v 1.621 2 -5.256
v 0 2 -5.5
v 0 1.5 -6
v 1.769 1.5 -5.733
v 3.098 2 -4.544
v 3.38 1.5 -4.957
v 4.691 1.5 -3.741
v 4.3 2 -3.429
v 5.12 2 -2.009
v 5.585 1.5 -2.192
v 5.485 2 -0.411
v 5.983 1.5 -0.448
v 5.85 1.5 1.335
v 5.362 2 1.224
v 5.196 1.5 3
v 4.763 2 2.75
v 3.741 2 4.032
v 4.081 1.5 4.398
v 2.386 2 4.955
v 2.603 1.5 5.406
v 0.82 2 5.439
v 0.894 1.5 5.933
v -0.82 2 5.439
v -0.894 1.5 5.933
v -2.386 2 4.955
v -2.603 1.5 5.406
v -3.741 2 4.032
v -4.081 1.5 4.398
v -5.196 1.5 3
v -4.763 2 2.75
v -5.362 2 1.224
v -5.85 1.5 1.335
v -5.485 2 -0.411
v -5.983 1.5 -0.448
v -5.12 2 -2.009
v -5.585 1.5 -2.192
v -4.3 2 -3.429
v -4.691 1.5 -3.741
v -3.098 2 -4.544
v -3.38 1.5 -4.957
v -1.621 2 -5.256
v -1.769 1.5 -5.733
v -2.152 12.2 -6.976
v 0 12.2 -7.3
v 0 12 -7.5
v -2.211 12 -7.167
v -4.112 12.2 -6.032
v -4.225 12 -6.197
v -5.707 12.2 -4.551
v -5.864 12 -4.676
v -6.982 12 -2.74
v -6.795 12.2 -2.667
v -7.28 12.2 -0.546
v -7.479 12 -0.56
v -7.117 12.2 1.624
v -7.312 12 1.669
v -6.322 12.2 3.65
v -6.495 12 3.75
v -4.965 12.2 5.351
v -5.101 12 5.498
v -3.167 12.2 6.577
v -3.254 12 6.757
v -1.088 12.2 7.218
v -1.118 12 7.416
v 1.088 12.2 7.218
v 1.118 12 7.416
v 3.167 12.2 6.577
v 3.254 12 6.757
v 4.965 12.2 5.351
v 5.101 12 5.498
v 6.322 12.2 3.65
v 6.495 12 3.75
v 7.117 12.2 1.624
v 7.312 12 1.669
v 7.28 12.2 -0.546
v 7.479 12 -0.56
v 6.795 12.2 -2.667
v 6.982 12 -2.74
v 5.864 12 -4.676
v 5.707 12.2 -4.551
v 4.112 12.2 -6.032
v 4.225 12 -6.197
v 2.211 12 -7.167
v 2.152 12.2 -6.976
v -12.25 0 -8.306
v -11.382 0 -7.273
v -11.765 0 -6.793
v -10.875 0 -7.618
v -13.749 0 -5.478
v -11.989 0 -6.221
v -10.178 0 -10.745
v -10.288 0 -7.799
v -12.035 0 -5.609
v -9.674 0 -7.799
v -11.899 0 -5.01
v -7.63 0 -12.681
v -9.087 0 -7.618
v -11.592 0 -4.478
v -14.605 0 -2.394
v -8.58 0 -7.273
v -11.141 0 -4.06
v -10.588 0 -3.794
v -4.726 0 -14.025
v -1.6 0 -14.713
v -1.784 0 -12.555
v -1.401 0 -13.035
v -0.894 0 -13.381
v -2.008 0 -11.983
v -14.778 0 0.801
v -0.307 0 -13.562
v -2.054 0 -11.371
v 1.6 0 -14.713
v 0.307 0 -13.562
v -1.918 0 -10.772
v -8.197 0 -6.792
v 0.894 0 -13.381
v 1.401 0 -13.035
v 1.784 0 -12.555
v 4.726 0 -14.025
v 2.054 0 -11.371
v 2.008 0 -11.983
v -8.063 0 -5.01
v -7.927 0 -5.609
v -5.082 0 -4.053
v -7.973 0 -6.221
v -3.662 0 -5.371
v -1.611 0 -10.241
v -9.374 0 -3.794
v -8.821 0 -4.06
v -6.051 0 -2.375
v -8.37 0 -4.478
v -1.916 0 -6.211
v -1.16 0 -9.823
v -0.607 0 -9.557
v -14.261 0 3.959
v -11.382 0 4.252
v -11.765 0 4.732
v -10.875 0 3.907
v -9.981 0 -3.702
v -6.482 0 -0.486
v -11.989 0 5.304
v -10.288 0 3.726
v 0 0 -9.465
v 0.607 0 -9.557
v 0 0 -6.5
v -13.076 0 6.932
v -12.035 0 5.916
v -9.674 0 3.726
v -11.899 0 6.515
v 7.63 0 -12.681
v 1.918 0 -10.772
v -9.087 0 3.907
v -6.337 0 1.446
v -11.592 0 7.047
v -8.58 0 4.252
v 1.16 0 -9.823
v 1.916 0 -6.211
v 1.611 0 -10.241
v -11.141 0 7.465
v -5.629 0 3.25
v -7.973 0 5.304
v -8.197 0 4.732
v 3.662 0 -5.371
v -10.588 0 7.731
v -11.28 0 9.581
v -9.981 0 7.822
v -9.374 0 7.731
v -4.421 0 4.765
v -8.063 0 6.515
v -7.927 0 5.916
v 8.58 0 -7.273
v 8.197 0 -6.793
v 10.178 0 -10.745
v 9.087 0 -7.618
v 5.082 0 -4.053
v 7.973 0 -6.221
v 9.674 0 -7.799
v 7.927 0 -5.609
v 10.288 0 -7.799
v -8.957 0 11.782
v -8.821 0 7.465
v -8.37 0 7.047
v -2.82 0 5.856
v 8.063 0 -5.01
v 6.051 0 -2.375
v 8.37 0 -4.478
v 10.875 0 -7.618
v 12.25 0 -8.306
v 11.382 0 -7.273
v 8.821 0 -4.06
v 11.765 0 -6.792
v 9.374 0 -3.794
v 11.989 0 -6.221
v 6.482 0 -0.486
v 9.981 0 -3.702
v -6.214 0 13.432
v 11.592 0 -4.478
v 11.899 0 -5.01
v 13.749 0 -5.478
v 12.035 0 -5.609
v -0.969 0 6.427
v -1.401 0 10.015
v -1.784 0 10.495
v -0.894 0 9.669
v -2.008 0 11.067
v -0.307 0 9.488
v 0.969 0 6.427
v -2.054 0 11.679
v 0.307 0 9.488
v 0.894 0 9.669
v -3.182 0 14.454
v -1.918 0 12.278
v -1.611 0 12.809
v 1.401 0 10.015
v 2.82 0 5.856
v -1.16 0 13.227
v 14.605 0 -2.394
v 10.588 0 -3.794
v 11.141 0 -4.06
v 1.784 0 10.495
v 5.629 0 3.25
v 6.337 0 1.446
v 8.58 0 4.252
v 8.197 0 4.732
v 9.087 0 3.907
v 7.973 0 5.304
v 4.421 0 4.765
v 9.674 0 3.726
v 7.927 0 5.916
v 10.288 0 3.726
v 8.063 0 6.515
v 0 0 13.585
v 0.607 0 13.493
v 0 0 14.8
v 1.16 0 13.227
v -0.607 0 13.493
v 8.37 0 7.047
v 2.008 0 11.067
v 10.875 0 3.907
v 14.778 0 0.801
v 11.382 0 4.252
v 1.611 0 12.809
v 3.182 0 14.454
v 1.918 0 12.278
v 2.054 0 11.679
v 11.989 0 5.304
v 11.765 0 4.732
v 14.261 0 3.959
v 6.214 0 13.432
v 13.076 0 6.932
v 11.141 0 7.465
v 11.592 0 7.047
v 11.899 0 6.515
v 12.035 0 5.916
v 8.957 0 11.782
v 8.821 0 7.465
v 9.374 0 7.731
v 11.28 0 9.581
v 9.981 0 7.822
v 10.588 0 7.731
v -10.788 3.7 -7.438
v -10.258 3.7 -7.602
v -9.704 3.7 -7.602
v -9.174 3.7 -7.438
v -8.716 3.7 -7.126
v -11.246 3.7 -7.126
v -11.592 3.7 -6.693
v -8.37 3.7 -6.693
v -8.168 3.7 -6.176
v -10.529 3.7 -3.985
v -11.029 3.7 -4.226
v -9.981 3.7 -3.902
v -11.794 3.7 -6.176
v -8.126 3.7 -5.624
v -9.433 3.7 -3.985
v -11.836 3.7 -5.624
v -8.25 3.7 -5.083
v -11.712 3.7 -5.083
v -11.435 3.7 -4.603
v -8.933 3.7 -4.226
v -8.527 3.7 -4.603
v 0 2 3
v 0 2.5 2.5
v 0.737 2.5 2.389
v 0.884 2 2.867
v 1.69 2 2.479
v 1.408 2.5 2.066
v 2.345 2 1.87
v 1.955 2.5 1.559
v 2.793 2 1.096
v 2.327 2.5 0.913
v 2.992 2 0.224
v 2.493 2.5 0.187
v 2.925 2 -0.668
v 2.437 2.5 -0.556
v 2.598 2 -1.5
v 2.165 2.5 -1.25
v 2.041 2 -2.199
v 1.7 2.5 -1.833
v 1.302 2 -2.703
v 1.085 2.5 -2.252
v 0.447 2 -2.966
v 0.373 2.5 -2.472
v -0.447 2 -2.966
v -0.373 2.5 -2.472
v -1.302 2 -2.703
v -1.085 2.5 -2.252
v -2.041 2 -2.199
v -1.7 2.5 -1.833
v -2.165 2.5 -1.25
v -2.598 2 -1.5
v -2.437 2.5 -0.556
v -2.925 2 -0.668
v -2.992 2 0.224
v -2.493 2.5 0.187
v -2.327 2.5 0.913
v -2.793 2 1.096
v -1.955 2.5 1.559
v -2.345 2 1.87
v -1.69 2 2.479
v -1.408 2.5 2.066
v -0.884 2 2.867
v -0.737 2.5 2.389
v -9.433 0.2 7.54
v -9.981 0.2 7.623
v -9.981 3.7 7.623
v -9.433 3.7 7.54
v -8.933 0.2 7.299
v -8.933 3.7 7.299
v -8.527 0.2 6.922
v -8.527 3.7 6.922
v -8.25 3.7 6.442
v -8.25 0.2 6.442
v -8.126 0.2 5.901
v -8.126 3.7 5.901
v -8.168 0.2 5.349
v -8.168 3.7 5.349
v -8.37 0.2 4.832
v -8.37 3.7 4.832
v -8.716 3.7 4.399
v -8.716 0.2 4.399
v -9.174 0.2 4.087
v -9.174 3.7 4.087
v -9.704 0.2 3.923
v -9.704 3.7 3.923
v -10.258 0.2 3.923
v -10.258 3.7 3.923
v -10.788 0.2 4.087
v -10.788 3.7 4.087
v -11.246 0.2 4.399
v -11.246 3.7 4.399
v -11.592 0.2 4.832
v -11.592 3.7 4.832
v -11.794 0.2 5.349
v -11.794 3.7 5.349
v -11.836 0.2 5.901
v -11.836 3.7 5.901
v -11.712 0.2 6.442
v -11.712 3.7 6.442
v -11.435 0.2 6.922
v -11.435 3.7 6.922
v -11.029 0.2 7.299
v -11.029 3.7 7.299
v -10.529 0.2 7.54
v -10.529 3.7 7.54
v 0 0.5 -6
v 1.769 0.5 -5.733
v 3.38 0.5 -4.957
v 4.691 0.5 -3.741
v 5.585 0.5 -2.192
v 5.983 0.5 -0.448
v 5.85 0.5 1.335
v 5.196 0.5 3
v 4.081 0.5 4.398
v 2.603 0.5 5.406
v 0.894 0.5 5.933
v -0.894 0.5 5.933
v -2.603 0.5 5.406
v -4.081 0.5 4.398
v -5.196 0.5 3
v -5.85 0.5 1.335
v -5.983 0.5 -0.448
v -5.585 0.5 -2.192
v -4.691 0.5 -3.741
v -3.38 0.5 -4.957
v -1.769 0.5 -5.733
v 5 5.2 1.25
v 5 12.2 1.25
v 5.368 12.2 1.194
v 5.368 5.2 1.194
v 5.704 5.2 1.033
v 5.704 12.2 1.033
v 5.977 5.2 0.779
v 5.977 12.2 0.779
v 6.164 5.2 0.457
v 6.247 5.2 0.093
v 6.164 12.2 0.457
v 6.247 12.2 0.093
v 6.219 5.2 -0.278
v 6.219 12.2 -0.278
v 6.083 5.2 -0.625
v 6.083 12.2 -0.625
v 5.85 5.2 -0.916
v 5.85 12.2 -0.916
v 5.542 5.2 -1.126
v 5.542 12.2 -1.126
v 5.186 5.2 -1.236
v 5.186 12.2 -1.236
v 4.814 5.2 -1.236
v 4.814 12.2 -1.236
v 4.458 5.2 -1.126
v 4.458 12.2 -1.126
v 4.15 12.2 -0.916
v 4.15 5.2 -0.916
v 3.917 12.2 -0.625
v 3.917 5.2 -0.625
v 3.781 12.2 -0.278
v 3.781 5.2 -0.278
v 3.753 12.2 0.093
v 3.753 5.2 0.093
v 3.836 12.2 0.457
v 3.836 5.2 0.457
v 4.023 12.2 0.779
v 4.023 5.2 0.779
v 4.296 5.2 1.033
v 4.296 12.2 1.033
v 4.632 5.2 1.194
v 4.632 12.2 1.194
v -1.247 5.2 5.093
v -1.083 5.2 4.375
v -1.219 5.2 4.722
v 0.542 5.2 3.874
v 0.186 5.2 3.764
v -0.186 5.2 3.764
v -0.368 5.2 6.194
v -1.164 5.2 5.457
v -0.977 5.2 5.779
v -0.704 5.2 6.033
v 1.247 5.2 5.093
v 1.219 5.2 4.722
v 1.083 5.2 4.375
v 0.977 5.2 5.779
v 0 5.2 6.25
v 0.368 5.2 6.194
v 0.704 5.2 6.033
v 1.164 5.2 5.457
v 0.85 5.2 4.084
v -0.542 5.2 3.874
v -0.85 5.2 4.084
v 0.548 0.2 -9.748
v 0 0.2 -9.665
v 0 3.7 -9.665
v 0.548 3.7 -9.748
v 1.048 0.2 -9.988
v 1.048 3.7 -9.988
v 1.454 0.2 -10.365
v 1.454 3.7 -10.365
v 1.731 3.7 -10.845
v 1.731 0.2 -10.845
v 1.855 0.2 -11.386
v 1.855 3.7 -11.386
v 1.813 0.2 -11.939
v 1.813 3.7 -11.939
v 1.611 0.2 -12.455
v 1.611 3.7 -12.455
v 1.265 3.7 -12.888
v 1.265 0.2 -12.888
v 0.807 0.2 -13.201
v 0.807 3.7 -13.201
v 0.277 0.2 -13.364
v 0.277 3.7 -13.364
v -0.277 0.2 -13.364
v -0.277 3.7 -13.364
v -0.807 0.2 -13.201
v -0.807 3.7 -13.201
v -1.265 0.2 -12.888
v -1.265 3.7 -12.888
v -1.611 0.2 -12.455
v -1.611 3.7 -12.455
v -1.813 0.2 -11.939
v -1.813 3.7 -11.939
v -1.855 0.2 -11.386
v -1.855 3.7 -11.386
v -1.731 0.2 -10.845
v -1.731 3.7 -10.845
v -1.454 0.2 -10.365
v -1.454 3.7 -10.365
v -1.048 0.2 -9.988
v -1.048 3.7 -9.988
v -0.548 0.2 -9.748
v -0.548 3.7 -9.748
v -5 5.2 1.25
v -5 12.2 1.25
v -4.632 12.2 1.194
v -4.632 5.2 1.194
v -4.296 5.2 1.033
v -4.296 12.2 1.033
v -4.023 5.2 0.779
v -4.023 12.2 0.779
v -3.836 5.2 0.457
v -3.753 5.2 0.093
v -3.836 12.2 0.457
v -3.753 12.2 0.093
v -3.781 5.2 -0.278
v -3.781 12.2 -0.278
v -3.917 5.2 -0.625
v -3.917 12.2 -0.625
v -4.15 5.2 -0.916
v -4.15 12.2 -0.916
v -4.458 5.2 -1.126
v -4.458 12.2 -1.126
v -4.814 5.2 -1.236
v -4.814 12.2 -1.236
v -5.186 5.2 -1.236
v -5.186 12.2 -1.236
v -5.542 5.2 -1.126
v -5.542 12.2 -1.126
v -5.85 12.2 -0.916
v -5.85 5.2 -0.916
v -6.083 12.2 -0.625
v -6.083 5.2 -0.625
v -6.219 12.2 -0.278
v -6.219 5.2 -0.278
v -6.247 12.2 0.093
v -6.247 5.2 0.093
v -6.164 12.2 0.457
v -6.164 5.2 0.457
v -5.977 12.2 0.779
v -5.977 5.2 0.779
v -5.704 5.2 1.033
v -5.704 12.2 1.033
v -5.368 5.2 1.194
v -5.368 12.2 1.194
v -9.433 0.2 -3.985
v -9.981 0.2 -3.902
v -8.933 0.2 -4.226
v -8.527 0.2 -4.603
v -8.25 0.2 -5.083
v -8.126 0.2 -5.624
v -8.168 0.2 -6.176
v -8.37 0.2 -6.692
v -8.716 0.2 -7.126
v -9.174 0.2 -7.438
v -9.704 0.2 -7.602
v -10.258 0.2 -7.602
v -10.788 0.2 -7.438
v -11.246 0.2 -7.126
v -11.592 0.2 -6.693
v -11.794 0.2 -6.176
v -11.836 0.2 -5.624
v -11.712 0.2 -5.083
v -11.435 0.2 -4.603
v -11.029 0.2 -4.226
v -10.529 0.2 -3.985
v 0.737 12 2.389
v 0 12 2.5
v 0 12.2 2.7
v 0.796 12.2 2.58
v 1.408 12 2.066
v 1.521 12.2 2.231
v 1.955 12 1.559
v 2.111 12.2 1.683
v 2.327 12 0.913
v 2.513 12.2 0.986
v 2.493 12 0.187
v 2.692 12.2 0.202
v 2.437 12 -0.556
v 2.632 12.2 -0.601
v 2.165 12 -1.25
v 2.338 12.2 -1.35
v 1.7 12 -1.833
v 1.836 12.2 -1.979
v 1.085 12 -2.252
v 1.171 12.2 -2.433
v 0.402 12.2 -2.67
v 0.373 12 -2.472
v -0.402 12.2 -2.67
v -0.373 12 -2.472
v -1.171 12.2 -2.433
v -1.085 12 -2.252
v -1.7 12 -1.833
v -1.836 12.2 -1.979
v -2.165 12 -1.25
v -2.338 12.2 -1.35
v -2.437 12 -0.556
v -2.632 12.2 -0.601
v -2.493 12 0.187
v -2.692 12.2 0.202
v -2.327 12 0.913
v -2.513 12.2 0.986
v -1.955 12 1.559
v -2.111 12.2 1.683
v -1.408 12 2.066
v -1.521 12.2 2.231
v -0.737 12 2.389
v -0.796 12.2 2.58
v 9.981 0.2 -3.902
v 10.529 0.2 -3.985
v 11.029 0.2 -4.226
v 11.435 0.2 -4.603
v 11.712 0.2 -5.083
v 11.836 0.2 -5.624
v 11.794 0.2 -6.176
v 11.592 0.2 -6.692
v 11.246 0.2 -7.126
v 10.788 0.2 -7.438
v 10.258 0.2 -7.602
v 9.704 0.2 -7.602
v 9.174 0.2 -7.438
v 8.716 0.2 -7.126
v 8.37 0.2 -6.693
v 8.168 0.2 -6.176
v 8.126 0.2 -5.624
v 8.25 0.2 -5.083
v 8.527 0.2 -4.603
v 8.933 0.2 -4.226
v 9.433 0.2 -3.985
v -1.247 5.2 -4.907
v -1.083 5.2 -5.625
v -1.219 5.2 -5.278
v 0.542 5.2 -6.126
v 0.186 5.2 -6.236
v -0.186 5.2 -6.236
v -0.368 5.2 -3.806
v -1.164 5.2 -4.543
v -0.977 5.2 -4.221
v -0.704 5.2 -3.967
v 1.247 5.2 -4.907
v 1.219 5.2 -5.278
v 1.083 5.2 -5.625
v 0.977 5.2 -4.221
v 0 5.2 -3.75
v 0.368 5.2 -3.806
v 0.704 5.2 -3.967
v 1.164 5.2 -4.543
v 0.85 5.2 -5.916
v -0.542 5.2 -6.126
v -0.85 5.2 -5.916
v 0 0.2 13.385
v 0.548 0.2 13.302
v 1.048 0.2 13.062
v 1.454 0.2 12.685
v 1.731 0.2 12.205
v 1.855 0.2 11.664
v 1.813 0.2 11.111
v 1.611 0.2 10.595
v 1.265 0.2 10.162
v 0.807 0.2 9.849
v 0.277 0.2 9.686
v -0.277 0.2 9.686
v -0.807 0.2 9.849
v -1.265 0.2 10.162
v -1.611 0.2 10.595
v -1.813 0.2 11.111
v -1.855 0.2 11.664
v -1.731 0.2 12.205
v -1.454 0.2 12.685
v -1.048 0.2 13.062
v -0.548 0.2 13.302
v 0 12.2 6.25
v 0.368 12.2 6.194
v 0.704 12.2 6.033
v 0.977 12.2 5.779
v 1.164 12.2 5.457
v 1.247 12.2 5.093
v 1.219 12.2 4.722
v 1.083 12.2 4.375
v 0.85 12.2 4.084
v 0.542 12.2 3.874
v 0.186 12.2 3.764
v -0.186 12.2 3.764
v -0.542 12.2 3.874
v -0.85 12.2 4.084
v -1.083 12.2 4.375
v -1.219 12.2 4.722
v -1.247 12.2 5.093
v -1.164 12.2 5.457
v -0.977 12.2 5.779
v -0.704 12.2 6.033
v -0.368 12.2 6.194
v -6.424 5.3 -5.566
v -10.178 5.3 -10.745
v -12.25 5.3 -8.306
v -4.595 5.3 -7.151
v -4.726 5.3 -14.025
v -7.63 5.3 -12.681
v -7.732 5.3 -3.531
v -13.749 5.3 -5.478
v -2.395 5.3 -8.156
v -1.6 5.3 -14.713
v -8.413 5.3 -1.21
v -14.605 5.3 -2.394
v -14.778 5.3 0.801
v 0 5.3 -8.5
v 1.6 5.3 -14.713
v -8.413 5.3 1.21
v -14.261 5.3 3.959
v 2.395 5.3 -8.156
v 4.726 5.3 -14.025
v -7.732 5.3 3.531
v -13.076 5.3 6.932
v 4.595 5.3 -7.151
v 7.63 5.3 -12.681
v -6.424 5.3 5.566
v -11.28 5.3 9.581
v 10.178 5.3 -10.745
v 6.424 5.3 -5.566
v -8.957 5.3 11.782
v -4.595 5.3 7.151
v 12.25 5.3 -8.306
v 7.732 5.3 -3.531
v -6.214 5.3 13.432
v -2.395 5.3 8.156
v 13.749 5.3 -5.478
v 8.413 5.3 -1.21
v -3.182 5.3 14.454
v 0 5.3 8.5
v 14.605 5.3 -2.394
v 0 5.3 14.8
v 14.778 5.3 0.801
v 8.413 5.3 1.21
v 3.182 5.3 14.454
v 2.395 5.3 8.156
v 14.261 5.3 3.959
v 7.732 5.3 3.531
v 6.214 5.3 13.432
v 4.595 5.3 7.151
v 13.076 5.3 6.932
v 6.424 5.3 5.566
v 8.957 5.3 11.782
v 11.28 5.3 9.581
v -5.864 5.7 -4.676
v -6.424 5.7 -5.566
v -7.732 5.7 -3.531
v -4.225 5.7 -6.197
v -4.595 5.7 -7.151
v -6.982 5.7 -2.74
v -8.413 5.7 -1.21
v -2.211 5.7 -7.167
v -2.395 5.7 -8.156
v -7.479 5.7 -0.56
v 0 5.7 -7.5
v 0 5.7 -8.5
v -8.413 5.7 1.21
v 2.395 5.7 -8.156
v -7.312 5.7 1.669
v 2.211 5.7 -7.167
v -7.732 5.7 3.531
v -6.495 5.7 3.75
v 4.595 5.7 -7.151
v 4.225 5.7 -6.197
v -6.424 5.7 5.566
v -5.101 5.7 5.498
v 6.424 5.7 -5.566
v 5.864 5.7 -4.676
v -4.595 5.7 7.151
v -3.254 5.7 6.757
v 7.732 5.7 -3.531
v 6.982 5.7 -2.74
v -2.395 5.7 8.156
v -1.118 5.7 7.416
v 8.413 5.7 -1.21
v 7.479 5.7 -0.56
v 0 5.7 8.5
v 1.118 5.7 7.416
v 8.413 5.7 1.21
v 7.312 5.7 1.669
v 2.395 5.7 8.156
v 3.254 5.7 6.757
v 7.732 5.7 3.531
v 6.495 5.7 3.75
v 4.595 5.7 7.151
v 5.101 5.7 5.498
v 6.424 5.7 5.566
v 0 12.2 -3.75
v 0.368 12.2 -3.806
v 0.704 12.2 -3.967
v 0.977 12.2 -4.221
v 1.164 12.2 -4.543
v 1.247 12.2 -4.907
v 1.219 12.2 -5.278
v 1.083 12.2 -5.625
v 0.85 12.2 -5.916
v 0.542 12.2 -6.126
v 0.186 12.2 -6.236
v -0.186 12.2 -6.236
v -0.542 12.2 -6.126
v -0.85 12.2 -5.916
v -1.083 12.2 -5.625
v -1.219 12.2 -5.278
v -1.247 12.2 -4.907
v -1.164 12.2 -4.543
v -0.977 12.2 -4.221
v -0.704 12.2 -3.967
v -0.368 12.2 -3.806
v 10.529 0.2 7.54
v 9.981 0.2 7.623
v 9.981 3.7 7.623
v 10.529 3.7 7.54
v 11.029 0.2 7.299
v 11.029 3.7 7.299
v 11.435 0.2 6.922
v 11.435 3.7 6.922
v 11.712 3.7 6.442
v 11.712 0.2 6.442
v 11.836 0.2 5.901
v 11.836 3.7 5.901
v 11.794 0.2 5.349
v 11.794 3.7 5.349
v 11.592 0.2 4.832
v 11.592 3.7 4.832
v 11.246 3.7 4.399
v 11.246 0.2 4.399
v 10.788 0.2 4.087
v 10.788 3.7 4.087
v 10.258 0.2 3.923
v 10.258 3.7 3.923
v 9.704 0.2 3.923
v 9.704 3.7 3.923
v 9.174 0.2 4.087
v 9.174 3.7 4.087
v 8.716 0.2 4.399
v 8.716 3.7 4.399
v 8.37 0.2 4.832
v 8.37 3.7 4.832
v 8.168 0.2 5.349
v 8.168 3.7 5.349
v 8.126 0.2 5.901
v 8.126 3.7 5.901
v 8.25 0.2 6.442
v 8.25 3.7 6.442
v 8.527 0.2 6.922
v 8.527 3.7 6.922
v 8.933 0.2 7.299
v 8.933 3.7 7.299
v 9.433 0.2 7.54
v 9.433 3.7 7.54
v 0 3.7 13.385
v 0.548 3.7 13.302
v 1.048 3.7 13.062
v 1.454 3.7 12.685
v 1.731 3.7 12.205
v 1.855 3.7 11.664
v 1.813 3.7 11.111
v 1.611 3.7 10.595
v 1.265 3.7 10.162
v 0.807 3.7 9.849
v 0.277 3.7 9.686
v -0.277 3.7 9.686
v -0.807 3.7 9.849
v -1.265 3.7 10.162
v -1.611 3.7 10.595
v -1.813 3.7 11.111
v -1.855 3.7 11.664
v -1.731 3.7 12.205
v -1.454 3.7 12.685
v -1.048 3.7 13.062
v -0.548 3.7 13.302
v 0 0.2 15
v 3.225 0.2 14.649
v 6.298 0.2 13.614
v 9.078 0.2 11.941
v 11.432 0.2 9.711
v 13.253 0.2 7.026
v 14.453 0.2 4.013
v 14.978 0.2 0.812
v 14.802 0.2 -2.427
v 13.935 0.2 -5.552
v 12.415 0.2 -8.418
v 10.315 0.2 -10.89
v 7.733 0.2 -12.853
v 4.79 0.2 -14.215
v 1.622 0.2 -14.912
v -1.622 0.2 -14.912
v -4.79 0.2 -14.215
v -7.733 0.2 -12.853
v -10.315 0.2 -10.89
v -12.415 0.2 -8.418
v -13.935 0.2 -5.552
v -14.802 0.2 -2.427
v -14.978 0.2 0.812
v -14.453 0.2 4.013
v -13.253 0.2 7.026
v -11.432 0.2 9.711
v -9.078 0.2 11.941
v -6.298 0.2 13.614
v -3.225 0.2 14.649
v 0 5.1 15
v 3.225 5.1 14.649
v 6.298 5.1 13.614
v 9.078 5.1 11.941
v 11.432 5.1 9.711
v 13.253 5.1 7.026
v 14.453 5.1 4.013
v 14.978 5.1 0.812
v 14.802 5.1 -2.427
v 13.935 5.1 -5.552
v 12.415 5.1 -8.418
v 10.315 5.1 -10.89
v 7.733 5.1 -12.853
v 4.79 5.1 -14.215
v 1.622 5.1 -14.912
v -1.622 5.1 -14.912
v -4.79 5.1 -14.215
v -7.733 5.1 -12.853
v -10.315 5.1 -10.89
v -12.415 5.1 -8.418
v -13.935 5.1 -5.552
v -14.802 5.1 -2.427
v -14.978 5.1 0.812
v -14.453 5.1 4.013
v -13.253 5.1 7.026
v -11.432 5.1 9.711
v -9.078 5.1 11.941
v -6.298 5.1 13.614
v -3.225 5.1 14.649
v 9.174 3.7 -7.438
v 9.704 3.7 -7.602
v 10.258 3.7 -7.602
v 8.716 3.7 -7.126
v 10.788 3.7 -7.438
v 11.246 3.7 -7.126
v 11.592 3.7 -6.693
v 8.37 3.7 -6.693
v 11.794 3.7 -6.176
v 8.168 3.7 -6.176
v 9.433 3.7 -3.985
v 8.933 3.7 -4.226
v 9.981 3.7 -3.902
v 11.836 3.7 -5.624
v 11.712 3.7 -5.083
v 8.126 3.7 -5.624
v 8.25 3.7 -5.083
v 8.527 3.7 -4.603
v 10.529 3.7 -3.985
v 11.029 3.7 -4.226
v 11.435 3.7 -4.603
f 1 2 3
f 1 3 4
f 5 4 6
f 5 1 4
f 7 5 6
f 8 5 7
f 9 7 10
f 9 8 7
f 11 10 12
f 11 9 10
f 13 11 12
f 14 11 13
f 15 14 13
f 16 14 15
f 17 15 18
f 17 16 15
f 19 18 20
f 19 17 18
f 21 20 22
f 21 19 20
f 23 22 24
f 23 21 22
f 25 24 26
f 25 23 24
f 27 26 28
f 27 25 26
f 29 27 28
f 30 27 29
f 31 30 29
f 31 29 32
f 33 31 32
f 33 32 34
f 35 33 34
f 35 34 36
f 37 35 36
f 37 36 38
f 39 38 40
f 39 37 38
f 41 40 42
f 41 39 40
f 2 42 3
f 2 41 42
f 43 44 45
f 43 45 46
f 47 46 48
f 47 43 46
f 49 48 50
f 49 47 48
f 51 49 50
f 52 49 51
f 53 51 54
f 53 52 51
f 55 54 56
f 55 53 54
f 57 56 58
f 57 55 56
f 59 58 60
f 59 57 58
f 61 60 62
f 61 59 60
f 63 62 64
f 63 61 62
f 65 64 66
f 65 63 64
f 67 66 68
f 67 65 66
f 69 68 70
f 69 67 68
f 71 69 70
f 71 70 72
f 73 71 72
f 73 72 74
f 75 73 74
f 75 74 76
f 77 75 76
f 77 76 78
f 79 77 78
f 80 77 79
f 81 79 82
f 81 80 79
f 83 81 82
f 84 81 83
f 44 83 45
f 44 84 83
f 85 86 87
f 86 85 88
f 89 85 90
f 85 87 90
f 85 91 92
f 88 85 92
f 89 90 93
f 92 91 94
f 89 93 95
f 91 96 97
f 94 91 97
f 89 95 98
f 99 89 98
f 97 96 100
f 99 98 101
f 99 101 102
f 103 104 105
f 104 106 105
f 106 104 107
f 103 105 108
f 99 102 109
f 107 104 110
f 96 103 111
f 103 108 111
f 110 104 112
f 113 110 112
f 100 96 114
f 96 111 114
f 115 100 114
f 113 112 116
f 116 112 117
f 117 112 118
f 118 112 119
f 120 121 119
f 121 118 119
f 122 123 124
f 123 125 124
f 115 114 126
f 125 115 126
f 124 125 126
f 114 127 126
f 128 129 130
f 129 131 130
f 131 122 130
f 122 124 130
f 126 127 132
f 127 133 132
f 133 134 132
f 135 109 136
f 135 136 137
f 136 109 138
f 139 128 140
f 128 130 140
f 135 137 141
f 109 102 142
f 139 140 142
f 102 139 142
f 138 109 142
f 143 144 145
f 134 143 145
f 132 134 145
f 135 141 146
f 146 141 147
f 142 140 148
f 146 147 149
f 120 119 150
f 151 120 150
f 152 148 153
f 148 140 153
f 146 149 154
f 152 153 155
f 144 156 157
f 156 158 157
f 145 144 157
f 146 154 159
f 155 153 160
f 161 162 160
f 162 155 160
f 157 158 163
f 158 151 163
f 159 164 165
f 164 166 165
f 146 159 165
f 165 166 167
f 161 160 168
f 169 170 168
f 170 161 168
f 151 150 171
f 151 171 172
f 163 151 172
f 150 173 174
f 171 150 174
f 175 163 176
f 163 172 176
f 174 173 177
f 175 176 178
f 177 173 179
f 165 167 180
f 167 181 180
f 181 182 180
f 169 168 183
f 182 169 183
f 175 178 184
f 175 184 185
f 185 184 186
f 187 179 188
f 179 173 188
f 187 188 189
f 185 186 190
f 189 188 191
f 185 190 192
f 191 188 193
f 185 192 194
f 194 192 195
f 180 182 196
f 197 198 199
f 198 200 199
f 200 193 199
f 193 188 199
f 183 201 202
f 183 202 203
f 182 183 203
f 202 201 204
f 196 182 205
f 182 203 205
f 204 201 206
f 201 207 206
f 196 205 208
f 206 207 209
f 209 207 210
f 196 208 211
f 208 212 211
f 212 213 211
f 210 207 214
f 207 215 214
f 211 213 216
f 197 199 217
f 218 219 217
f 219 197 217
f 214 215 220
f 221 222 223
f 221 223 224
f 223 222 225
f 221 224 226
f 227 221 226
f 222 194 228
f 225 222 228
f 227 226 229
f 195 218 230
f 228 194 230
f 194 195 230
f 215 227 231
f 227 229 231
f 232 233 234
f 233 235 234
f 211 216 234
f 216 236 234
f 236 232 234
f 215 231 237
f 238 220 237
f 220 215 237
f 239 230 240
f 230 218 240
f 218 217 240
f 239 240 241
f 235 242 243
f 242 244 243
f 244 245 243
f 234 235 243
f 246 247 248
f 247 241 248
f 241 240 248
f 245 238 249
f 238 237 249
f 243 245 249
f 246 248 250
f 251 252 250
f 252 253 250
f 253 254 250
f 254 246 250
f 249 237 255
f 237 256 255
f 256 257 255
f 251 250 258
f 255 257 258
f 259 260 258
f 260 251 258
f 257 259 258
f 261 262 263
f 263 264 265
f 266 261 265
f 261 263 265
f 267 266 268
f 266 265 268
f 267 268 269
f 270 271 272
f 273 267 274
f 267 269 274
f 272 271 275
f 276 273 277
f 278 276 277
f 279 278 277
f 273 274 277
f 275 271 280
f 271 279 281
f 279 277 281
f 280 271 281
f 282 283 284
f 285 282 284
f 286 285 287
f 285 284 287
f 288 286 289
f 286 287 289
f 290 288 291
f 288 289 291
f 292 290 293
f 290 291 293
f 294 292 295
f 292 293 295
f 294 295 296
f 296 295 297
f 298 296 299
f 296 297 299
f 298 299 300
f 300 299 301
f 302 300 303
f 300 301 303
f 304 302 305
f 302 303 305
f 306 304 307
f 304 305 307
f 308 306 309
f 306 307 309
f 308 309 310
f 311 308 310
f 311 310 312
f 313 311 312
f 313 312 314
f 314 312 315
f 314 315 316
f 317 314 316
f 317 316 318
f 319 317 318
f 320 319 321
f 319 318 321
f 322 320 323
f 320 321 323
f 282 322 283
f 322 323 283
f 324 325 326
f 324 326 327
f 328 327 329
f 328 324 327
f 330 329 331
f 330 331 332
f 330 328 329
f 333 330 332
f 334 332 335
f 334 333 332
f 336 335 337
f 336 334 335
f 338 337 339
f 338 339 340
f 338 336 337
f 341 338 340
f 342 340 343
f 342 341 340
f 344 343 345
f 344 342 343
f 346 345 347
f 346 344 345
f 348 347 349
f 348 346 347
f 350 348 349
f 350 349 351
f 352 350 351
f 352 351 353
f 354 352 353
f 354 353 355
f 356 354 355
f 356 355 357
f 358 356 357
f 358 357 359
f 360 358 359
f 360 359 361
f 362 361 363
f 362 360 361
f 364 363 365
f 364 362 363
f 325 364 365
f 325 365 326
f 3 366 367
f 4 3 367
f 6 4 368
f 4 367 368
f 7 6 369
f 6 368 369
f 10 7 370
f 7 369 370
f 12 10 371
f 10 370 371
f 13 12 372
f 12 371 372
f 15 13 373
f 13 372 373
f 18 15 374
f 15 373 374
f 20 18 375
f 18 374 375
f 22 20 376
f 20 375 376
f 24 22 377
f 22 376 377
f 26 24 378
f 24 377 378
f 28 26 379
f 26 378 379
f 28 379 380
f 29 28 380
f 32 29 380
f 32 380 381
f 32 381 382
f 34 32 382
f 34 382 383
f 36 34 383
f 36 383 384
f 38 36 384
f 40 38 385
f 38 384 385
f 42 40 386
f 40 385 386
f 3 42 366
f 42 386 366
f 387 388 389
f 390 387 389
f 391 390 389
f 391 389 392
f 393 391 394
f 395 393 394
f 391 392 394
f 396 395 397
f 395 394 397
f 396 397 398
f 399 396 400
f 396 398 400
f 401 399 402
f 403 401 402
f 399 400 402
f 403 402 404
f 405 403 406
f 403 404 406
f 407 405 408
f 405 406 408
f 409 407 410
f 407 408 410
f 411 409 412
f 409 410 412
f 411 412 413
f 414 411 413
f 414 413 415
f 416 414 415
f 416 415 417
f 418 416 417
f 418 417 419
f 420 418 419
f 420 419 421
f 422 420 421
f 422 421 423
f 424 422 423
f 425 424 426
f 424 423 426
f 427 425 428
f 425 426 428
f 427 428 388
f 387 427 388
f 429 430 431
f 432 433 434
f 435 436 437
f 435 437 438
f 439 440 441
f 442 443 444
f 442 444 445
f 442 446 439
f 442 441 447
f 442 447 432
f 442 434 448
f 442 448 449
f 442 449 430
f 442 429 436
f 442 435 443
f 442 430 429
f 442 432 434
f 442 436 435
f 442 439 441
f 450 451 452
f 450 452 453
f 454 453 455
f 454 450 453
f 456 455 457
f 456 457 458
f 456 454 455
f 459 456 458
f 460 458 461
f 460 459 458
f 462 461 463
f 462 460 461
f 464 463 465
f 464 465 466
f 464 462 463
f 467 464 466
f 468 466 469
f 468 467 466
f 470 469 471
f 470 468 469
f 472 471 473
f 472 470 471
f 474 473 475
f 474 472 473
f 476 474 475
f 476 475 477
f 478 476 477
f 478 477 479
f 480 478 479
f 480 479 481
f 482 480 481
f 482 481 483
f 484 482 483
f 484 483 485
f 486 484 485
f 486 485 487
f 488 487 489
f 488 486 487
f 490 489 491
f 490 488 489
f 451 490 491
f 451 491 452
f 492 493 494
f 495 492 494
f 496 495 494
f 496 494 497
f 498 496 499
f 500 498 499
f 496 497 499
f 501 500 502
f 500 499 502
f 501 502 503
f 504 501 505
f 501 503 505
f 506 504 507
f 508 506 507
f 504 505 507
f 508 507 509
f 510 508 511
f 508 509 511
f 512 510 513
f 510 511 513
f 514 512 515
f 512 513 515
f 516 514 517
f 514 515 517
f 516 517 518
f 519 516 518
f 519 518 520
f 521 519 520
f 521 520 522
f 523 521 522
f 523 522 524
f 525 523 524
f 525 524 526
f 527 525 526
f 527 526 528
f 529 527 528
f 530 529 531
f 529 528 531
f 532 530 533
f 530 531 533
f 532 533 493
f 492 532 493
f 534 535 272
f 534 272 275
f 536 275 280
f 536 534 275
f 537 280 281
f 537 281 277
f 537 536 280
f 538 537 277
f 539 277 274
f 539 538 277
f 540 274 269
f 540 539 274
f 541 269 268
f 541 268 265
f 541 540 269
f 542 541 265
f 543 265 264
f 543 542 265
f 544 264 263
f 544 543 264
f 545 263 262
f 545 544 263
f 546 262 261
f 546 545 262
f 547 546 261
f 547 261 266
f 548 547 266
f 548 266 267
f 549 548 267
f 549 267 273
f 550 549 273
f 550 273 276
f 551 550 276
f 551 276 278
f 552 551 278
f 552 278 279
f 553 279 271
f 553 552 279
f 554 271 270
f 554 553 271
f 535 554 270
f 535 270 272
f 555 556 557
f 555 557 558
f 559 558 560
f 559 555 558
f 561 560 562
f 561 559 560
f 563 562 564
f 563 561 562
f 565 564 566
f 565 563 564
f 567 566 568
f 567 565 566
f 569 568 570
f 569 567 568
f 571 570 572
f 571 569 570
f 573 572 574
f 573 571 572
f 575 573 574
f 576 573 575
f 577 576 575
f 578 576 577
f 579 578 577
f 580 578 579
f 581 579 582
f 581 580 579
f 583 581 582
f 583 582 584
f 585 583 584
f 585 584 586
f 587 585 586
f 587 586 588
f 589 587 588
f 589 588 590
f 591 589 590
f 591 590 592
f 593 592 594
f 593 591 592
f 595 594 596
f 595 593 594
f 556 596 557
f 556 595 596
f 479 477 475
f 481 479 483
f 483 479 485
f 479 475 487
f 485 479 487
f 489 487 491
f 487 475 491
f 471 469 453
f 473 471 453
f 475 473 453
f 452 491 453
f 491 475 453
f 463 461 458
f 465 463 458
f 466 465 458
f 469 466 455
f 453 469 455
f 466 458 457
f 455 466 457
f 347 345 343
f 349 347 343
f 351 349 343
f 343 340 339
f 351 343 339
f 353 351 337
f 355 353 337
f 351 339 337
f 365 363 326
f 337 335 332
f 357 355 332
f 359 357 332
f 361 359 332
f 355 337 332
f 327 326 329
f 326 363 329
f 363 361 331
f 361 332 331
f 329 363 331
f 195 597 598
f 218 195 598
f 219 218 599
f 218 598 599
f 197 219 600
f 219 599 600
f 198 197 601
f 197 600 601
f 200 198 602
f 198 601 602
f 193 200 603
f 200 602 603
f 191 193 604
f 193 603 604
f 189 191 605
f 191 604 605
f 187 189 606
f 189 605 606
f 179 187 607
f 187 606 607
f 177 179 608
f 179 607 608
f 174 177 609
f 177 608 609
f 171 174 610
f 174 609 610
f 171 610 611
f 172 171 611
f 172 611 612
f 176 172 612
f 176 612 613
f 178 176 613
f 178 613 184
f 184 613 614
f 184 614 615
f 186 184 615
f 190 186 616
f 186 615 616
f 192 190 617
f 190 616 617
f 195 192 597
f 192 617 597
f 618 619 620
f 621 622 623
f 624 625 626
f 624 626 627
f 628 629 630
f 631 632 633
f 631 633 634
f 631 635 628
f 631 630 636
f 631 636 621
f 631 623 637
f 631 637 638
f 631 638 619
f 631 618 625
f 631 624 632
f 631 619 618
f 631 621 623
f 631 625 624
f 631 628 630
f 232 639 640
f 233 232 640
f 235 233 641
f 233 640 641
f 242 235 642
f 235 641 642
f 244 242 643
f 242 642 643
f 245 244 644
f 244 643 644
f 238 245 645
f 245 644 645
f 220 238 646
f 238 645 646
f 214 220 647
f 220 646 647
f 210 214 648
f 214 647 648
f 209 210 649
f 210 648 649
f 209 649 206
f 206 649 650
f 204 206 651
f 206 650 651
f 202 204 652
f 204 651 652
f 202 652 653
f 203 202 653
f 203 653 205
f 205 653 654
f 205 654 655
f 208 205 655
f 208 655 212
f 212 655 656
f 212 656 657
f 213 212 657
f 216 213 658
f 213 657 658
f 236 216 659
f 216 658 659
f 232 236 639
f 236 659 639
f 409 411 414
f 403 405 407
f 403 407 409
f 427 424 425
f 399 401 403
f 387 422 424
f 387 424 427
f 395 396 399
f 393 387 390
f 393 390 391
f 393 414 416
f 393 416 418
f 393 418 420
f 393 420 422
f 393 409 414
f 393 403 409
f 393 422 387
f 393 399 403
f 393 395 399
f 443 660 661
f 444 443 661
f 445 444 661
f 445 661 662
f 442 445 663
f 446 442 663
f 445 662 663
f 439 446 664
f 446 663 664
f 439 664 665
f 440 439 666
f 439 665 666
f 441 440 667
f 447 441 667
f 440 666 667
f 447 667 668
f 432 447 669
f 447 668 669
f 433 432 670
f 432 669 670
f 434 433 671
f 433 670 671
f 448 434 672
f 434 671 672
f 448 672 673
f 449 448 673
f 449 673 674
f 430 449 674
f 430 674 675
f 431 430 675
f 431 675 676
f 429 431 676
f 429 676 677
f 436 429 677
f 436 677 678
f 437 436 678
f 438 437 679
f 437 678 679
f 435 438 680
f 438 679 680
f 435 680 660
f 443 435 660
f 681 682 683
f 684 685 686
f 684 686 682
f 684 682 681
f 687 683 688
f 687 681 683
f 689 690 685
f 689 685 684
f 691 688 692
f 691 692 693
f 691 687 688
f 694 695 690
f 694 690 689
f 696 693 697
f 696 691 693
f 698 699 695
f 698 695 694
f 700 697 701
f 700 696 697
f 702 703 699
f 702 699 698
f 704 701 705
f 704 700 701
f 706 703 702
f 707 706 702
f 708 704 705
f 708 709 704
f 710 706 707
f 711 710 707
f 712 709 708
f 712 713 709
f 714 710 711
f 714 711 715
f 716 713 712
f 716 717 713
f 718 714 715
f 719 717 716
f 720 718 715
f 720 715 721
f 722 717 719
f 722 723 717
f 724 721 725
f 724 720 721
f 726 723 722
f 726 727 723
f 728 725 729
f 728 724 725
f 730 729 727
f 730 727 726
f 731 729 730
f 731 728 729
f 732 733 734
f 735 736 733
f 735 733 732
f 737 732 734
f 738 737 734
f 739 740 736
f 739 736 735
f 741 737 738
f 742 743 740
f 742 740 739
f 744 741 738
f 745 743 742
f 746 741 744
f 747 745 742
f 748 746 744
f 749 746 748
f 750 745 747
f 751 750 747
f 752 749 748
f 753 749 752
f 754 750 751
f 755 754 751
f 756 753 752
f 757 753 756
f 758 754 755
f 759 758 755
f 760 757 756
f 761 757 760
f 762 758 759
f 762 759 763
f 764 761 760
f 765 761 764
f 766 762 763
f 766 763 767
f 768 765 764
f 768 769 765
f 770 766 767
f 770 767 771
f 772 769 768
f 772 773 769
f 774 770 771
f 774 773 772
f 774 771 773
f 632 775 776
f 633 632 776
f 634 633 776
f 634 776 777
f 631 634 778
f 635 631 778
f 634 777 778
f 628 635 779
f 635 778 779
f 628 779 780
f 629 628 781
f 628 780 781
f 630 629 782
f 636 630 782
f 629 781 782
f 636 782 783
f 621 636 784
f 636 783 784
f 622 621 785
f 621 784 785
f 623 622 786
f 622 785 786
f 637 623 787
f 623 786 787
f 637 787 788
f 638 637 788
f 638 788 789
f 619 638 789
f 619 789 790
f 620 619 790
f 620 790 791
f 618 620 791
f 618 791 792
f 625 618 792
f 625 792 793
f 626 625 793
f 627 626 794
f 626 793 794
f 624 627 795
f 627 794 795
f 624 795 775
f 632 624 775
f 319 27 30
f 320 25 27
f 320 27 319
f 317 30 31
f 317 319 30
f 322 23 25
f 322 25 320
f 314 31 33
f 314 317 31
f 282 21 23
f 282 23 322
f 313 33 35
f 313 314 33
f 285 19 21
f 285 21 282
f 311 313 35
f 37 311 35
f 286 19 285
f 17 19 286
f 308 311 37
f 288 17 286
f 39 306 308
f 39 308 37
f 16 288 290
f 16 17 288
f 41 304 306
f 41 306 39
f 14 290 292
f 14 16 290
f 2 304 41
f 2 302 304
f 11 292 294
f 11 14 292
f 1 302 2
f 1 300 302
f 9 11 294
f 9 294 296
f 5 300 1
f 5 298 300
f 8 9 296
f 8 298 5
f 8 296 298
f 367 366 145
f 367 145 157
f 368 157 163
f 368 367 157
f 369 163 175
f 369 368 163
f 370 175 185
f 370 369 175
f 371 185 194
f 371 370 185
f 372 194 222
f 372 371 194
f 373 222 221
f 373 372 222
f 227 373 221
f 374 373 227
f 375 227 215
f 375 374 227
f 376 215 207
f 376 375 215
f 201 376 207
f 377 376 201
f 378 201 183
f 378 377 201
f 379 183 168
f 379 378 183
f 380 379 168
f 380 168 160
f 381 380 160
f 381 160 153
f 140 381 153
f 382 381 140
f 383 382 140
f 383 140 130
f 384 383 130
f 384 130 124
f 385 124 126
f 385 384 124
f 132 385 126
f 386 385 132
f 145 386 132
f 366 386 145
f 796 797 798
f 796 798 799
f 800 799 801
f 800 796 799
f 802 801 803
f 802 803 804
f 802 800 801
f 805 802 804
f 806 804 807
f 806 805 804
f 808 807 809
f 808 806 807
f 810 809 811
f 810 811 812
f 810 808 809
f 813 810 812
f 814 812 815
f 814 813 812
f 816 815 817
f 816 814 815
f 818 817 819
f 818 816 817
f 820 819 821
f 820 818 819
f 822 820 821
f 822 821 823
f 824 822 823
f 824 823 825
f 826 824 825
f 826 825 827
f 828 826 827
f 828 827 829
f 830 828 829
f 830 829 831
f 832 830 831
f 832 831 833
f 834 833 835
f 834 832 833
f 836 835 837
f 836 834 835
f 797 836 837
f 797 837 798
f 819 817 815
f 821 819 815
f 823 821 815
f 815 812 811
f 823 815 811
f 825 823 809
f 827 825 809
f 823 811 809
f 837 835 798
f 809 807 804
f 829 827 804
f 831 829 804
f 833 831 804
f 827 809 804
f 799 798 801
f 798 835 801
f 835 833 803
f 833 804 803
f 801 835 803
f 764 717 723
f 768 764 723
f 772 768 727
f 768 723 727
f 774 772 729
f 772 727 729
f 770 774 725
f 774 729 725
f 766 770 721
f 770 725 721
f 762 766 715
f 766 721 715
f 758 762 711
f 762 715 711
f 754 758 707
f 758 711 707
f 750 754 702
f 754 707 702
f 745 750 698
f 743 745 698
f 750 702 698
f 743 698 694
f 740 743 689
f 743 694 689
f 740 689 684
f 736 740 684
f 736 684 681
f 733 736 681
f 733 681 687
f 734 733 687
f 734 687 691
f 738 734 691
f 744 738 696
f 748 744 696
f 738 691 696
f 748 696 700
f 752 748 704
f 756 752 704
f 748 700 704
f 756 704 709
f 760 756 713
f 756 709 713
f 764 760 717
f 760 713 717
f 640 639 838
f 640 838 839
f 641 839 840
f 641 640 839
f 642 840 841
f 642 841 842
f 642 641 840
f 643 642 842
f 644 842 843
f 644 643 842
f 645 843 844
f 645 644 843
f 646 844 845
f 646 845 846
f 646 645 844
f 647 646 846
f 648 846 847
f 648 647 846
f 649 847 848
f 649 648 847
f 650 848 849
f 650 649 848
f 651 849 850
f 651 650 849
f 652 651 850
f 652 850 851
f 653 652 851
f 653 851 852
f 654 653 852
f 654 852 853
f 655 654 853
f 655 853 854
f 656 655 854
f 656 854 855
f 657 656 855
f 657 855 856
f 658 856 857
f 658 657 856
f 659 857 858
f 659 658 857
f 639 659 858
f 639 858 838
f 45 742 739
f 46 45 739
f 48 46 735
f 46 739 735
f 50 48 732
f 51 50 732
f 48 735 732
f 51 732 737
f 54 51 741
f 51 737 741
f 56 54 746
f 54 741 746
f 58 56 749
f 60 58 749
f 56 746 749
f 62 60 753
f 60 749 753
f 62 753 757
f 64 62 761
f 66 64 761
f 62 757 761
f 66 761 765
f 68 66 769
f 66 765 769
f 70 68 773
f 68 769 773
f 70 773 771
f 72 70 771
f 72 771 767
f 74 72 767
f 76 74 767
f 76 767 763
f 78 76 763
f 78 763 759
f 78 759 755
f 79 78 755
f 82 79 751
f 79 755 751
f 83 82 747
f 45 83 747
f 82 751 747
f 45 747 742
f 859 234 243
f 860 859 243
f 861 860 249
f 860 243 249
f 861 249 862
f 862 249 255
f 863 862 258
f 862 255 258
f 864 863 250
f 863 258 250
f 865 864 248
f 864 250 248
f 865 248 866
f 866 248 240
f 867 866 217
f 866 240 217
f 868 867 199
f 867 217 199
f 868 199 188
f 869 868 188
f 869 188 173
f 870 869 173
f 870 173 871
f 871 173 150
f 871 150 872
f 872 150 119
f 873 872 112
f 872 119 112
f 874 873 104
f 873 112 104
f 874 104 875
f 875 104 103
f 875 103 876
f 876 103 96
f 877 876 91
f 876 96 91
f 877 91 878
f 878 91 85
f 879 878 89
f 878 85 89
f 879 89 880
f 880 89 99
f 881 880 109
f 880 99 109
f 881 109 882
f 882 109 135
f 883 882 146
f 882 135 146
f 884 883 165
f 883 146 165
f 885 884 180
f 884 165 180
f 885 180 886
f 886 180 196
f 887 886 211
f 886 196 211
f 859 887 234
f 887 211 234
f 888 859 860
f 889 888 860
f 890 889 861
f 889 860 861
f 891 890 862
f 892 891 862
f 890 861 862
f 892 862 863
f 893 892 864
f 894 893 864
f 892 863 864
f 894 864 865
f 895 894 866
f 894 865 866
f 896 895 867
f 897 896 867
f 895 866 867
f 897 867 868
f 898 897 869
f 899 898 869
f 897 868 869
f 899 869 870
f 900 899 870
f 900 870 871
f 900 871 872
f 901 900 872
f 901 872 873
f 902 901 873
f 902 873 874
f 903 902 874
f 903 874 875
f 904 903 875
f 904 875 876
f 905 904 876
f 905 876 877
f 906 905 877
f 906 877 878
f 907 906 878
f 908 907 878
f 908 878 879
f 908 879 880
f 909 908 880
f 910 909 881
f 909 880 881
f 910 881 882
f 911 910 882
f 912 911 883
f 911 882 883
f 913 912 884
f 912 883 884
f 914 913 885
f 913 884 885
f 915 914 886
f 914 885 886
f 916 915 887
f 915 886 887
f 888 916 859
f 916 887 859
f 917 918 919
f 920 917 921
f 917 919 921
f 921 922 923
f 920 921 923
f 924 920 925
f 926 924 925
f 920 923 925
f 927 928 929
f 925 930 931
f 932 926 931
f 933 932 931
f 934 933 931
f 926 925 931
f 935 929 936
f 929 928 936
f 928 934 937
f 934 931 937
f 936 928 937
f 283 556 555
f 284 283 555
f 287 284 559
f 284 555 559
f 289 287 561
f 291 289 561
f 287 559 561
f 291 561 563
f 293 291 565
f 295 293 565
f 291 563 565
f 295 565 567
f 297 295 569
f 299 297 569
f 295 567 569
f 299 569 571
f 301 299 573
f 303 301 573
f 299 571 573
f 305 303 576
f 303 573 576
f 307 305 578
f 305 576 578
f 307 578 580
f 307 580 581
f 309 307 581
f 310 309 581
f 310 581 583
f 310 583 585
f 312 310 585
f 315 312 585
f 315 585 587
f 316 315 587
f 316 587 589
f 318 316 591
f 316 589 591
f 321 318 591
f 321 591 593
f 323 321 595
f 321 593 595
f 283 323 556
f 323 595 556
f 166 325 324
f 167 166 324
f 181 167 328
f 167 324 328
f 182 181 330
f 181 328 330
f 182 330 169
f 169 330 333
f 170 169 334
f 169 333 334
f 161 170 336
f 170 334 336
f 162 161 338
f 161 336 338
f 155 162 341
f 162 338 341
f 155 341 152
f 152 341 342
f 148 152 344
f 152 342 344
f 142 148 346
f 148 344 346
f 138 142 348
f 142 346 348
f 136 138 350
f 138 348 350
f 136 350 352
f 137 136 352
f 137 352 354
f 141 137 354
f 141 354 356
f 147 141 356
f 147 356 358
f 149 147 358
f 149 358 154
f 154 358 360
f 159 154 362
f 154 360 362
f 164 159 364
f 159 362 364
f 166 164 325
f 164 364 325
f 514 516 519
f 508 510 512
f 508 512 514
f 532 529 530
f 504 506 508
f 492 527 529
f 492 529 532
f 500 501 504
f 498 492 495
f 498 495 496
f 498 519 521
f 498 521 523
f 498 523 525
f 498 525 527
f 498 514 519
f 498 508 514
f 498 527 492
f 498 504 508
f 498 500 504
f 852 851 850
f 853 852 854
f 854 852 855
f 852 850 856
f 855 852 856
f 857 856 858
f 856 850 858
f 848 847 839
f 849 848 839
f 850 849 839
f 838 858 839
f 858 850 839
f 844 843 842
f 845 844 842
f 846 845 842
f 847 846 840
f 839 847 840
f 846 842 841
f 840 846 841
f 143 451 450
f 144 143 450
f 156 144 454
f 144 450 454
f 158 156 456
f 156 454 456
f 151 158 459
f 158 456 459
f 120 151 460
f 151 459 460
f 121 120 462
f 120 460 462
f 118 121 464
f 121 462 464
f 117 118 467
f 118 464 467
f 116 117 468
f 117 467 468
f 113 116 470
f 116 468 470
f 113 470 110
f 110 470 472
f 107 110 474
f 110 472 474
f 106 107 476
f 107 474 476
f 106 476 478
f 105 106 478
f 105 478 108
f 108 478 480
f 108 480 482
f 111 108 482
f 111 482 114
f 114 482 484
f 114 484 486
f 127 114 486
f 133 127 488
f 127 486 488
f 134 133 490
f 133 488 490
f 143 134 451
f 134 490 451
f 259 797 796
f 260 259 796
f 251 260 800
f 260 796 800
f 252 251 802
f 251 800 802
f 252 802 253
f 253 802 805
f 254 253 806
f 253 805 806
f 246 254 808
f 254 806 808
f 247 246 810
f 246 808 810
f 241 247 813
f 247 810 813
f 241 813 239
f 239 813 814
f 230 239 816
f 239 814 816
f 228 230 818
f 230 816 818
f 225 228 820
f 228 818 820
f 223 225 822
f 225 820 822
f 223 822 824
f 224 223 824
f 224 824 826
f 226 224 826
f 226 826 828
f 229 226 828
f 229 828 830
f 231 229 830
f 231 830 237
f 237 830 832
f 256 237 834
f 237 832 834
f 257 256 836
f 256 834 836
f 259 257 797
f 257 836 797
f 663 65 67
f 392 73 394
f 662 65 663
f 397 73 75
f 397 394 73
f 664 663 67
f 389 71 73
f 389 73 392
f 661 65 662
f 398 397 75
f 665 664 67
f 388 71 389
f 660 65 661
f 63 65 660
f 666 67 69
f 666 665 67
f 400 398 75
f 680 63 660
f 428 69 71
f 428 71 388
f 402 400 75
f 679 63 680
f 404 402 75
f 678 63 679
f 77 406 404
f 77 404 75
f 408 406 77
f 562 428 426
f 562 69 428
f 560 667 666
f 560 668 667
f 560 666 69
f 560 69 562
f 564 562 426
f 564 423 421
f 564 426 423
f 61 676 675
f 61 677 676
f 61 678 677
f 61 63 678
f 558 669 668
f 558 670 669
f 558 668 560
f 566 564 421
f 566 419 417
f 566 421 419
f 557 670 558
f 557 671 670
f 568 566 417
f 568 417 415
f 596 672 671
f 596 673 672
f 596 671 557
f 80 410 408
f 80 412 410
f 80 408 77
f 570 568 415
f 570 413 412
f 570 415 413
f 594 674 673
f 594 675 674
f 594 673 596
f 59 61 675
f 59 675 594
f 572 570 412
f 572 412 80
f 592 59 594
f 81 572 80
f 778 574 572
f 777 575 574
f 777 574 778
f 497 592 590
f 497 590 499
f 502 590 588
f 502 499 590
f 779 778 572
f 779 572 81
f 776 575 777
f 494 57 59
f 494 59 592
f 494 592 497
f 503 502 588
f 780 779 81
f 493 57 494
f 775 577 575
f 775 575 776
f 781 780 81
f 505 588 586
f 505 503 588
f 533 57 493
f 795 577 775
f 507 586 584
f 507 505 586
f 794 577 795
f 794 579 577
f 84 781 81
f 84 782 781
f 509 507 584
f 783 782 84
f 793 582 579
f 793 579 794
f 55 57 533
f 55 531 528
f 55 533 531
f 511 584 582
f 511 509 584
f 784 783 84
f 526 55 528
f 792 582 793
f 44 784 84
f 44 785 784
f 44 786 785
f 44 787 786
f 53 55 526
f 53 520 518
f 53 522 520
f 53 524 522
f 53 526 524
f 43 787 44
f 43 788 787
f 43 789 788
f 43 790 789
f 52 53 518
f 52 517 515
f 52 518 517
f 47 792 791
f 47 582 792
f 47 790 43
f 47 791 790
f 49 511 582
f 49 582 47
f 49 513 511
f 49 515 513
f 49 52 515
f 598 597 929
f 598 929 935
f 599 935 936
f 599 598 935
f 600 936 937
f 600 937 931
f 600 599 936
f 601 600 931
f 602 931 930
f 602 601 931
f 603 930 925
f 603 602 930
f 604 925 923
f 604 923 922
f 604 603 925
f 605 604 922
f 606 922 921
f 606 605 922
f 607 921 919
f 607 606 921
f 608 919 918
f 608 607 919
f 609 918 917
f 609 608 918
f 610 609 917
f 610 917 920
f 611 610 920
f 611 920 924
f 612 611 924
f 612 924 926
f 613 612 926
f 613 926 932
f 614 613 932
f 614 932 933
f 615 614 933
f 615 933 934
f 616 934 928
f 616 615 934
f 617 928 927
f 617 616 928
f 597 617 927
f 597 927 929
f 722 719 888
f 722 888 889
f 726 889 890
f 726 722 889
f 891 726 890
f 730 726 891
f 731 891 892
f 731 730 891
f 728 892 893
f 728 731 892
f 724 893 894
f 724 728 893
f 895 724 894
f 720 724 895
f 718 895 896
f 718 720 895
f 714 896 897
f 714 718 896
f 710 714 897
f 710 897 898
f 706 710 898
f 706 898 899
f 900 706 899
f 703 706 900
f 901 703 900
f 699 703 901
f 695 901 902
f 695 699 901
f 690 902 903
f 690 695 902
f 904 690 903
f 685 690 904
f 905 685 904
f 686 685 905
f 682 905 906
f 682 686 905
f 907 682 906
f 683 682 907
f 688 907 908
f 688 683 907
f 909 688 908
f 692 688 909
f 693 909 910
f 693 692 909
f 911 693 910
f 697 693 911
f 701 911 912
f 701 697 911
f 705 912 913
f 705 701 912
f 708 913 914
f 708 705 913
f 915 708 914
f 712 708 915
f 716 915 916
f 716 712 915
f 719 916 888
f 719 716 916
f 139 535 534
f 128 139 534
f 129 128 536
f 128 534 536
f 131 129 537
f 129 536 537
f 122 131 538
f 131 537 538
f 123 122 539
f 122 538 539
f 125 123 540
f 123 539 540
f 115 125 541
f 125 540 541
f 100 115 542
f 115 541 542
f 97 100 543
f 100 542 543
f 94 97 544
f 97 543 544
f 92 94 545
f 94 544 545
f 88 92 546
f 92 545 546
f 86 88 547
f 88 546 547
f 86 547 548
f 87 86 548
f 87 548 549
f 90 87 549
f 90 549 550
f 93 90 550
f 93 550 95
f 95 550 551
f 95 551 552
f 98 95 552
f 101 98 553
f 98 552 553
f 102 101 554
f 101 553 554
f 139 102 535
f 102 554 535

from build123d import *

# Parameters (mm, degrees)
SKETCH_1_R          = 15
SKETCH_1_R_2        = 1.86
EXTRUDE_1_DEPTH     = 3.7
SKETCH_2_R          = 15
EXTRUDE_2_DEPTH     = 1.6
SKETCH_3_R          = 8.5
EXTRUDE_3_DEPTH     = 0.4
SKETCH_4_R          = 7.5
EXTRUDE_4_DEPTH     = 6.5
SKETCH_5_R          = 1.25
SKETCH_5_R_2        = 2.5
CUT_EXTRUDE_1_DEPTH = 7
CHAMFER_1_SIZE      = 0.2
SKETCH_7_R          = 2.5
CUT_EXTRUDE_4_DEPTH = 23.338307904
SKETCH_8_R          = 6
CUT_EXTRUDE_5_DEPTH = 2
CHAMFER_2_SIZE      = 0.5


with BuildPart() as part:
    # 草图1 → 凸台-拉伸1 (new body)
    with BuildSketch(Plane(origin=(0, 0, 0), x_dir=(1, 0, 0), z_dir=(0, 1, 0))):
        with Locations(Location((0, 0, 0), (0, 0, 270))):
            Circle(SKETCH_1_R)
        with Locations(Location((0, 11.525, 0), (0, 0, 270))):
            Circle(SKETCH_1_R_2, mode=Mode.SUBTRACT)
        with Locations(Location((9.980942779, 5.7625, 0), (0, 0, 270))):
            Circle(SKETCH_1_R_2, mode=Mode.SUBTRACT)
        with Locations(Location((9.980942779, -5.7625, 0), (0, 0, 270))):
            Circle(SKETCH_1_R_2, mode=Mode.SUBTRACT)
        with Locations(Location((0, -11.525, 0), (0, 0, 270))):
            Circle(SKETCH_1_R_2, mode=Mode.SUBTRACT)
        with Locations(Location((-9.980942779, -5.7625, 0), (0, 0, 270))):
            Circle(SKETCH_1_R_2, mode=Mode.SUBTRACT)
        with Locations(Location((-9.980942779, 5.7625, 0), (0, 0, 270))):
            Circle(SKETCH_1_R_2, mode=Mode.SUBTRACT)
    extrude(amount=EXTRUDE_1_DEPTH)

    # 草图2 → 凸台-拉伸2 (add)
    with BuildSketch(Plane(origin=(0, 3.7, 0), x_dir=(1, 0, 0), z_dir=(0, 1, 0))):
        with Locations(Location((0, 0, 0), (0, 0, 270))):
            Circle(SKETCH_2_R)
    extrude(amount=EXTRUDE_2_DEPTH)

    # 草图3 → 凸台-拉伸3 (add)
    with BuildSketch(Plane(origin=(0, 5.3, 0), x_dir=(1, 0, 0), z_dir=(0, 1, 0))):
        with Locations(Location((0, 0, 0), (0, 0, 270))):
            Circle(SKETCH_3_R)
    extrude(amount=EXTRUDE_3_DEPTH)

    # 草图4 → 凸台-拉伸4 (add)
    with BuildSketch(Plane(origin=(0, 5.7, 0), x_dir=(1, 0, 0), z_dir=(0, 1, 0))):
        with Locations(Location((0, 0, 0), (0, 0, 90))):
            Circle(SKETCH_4_R)
    extrude(amount=EXTRUDE_4_DEPTH)

    # 草图5 → 切除-拉伸1 (cut)
    with BuildSketch(Plane(origin=(0, 12.2, 0), x_dir=(1, 0, 0), z_dir=(0, 1, 0))):
        with Locations(Location((0, 5, 0), (0, 0, 270))):
            Circle(SKETCH_5_R)
        with Locations(Location((5, 0, 0), (0, 0, 270))):
            Circle(SKETCH_5_R)
        with Locations(Location((0, -5, 0), (0, 0, 270))):
            Circle(SKETCH_5_R)
        with Locations(Location((-5, 0, 0), (0, 0, 270))):
            Circle(SKETCH_5_R)
        with Locations(Location((0, 0, 0), (0, 0, 270))):
            Circle(SKETCH_5_R_2)
    extrude(amount=-CUT_EXTRUDE_1_DEPTH, mode=Mode.SUBTRACT)

    # 倒角1
    chamfer_1_edges = [part.edges().sort_by_distance(p)[0] for p in [
        (9.980942779, 0, 3.9025),
        (0, 0, 9.665),
        (0, 0, -15),
        (-9.980942779, 0, 3.9025),
        (-9.980942779, 0, -7.6225),
        (0, 5.3, -15),
        (0, 12.2, 7.5),
        (0, 0, -13.385),
        (0, 12.2, -2.5),
        (9.980942779, 0, -7.6225),
    ]]
    chamfer(chamfer_1_edges, length=CHAMFER_1_SIZE)

    # 草图7 → 切除-拉伸4 (cut, through all)
    with BuildSketch(Plane(origin=(0, 5.2, 0), x_dir=(1, 0, 0), z_dir=(0, 1, 0))):
        with Locations(Location((0, 0, 0), (0, 0, 270))):
            Circle(SKETCH_7_R)
    extrude(amount=-CUT_EXTRUDE_4_DEPTH, mode=Mode.SUBTRACT)

    # 草图8 → 切除-拉伸5 (cut)
    with BuildSketch(Plane(origin=(0, 0, 0), x_dir=(-1, 0, 0), z_dir=(0, -1, 0))):
        with Locations(Location((0, 0, 0), (0, 0, 90))):
            Circle(SKETCH_8_R)
    extrude(amount=-CUT_EXTRUDE_5_DEPTH, mode=Mode.SUBTRACT)

    # 倒角2
    chamfer_2_edges = [part.edges().sort_by_distance(p)[0] for p in [
        (0, 0, 6),
        (0, 2, 6),
        (0, 2, -2.5),
    ]]
    chamfer(chamfer_2_edges, length=CHAMFER_2_SIZE)


solid = part.part
